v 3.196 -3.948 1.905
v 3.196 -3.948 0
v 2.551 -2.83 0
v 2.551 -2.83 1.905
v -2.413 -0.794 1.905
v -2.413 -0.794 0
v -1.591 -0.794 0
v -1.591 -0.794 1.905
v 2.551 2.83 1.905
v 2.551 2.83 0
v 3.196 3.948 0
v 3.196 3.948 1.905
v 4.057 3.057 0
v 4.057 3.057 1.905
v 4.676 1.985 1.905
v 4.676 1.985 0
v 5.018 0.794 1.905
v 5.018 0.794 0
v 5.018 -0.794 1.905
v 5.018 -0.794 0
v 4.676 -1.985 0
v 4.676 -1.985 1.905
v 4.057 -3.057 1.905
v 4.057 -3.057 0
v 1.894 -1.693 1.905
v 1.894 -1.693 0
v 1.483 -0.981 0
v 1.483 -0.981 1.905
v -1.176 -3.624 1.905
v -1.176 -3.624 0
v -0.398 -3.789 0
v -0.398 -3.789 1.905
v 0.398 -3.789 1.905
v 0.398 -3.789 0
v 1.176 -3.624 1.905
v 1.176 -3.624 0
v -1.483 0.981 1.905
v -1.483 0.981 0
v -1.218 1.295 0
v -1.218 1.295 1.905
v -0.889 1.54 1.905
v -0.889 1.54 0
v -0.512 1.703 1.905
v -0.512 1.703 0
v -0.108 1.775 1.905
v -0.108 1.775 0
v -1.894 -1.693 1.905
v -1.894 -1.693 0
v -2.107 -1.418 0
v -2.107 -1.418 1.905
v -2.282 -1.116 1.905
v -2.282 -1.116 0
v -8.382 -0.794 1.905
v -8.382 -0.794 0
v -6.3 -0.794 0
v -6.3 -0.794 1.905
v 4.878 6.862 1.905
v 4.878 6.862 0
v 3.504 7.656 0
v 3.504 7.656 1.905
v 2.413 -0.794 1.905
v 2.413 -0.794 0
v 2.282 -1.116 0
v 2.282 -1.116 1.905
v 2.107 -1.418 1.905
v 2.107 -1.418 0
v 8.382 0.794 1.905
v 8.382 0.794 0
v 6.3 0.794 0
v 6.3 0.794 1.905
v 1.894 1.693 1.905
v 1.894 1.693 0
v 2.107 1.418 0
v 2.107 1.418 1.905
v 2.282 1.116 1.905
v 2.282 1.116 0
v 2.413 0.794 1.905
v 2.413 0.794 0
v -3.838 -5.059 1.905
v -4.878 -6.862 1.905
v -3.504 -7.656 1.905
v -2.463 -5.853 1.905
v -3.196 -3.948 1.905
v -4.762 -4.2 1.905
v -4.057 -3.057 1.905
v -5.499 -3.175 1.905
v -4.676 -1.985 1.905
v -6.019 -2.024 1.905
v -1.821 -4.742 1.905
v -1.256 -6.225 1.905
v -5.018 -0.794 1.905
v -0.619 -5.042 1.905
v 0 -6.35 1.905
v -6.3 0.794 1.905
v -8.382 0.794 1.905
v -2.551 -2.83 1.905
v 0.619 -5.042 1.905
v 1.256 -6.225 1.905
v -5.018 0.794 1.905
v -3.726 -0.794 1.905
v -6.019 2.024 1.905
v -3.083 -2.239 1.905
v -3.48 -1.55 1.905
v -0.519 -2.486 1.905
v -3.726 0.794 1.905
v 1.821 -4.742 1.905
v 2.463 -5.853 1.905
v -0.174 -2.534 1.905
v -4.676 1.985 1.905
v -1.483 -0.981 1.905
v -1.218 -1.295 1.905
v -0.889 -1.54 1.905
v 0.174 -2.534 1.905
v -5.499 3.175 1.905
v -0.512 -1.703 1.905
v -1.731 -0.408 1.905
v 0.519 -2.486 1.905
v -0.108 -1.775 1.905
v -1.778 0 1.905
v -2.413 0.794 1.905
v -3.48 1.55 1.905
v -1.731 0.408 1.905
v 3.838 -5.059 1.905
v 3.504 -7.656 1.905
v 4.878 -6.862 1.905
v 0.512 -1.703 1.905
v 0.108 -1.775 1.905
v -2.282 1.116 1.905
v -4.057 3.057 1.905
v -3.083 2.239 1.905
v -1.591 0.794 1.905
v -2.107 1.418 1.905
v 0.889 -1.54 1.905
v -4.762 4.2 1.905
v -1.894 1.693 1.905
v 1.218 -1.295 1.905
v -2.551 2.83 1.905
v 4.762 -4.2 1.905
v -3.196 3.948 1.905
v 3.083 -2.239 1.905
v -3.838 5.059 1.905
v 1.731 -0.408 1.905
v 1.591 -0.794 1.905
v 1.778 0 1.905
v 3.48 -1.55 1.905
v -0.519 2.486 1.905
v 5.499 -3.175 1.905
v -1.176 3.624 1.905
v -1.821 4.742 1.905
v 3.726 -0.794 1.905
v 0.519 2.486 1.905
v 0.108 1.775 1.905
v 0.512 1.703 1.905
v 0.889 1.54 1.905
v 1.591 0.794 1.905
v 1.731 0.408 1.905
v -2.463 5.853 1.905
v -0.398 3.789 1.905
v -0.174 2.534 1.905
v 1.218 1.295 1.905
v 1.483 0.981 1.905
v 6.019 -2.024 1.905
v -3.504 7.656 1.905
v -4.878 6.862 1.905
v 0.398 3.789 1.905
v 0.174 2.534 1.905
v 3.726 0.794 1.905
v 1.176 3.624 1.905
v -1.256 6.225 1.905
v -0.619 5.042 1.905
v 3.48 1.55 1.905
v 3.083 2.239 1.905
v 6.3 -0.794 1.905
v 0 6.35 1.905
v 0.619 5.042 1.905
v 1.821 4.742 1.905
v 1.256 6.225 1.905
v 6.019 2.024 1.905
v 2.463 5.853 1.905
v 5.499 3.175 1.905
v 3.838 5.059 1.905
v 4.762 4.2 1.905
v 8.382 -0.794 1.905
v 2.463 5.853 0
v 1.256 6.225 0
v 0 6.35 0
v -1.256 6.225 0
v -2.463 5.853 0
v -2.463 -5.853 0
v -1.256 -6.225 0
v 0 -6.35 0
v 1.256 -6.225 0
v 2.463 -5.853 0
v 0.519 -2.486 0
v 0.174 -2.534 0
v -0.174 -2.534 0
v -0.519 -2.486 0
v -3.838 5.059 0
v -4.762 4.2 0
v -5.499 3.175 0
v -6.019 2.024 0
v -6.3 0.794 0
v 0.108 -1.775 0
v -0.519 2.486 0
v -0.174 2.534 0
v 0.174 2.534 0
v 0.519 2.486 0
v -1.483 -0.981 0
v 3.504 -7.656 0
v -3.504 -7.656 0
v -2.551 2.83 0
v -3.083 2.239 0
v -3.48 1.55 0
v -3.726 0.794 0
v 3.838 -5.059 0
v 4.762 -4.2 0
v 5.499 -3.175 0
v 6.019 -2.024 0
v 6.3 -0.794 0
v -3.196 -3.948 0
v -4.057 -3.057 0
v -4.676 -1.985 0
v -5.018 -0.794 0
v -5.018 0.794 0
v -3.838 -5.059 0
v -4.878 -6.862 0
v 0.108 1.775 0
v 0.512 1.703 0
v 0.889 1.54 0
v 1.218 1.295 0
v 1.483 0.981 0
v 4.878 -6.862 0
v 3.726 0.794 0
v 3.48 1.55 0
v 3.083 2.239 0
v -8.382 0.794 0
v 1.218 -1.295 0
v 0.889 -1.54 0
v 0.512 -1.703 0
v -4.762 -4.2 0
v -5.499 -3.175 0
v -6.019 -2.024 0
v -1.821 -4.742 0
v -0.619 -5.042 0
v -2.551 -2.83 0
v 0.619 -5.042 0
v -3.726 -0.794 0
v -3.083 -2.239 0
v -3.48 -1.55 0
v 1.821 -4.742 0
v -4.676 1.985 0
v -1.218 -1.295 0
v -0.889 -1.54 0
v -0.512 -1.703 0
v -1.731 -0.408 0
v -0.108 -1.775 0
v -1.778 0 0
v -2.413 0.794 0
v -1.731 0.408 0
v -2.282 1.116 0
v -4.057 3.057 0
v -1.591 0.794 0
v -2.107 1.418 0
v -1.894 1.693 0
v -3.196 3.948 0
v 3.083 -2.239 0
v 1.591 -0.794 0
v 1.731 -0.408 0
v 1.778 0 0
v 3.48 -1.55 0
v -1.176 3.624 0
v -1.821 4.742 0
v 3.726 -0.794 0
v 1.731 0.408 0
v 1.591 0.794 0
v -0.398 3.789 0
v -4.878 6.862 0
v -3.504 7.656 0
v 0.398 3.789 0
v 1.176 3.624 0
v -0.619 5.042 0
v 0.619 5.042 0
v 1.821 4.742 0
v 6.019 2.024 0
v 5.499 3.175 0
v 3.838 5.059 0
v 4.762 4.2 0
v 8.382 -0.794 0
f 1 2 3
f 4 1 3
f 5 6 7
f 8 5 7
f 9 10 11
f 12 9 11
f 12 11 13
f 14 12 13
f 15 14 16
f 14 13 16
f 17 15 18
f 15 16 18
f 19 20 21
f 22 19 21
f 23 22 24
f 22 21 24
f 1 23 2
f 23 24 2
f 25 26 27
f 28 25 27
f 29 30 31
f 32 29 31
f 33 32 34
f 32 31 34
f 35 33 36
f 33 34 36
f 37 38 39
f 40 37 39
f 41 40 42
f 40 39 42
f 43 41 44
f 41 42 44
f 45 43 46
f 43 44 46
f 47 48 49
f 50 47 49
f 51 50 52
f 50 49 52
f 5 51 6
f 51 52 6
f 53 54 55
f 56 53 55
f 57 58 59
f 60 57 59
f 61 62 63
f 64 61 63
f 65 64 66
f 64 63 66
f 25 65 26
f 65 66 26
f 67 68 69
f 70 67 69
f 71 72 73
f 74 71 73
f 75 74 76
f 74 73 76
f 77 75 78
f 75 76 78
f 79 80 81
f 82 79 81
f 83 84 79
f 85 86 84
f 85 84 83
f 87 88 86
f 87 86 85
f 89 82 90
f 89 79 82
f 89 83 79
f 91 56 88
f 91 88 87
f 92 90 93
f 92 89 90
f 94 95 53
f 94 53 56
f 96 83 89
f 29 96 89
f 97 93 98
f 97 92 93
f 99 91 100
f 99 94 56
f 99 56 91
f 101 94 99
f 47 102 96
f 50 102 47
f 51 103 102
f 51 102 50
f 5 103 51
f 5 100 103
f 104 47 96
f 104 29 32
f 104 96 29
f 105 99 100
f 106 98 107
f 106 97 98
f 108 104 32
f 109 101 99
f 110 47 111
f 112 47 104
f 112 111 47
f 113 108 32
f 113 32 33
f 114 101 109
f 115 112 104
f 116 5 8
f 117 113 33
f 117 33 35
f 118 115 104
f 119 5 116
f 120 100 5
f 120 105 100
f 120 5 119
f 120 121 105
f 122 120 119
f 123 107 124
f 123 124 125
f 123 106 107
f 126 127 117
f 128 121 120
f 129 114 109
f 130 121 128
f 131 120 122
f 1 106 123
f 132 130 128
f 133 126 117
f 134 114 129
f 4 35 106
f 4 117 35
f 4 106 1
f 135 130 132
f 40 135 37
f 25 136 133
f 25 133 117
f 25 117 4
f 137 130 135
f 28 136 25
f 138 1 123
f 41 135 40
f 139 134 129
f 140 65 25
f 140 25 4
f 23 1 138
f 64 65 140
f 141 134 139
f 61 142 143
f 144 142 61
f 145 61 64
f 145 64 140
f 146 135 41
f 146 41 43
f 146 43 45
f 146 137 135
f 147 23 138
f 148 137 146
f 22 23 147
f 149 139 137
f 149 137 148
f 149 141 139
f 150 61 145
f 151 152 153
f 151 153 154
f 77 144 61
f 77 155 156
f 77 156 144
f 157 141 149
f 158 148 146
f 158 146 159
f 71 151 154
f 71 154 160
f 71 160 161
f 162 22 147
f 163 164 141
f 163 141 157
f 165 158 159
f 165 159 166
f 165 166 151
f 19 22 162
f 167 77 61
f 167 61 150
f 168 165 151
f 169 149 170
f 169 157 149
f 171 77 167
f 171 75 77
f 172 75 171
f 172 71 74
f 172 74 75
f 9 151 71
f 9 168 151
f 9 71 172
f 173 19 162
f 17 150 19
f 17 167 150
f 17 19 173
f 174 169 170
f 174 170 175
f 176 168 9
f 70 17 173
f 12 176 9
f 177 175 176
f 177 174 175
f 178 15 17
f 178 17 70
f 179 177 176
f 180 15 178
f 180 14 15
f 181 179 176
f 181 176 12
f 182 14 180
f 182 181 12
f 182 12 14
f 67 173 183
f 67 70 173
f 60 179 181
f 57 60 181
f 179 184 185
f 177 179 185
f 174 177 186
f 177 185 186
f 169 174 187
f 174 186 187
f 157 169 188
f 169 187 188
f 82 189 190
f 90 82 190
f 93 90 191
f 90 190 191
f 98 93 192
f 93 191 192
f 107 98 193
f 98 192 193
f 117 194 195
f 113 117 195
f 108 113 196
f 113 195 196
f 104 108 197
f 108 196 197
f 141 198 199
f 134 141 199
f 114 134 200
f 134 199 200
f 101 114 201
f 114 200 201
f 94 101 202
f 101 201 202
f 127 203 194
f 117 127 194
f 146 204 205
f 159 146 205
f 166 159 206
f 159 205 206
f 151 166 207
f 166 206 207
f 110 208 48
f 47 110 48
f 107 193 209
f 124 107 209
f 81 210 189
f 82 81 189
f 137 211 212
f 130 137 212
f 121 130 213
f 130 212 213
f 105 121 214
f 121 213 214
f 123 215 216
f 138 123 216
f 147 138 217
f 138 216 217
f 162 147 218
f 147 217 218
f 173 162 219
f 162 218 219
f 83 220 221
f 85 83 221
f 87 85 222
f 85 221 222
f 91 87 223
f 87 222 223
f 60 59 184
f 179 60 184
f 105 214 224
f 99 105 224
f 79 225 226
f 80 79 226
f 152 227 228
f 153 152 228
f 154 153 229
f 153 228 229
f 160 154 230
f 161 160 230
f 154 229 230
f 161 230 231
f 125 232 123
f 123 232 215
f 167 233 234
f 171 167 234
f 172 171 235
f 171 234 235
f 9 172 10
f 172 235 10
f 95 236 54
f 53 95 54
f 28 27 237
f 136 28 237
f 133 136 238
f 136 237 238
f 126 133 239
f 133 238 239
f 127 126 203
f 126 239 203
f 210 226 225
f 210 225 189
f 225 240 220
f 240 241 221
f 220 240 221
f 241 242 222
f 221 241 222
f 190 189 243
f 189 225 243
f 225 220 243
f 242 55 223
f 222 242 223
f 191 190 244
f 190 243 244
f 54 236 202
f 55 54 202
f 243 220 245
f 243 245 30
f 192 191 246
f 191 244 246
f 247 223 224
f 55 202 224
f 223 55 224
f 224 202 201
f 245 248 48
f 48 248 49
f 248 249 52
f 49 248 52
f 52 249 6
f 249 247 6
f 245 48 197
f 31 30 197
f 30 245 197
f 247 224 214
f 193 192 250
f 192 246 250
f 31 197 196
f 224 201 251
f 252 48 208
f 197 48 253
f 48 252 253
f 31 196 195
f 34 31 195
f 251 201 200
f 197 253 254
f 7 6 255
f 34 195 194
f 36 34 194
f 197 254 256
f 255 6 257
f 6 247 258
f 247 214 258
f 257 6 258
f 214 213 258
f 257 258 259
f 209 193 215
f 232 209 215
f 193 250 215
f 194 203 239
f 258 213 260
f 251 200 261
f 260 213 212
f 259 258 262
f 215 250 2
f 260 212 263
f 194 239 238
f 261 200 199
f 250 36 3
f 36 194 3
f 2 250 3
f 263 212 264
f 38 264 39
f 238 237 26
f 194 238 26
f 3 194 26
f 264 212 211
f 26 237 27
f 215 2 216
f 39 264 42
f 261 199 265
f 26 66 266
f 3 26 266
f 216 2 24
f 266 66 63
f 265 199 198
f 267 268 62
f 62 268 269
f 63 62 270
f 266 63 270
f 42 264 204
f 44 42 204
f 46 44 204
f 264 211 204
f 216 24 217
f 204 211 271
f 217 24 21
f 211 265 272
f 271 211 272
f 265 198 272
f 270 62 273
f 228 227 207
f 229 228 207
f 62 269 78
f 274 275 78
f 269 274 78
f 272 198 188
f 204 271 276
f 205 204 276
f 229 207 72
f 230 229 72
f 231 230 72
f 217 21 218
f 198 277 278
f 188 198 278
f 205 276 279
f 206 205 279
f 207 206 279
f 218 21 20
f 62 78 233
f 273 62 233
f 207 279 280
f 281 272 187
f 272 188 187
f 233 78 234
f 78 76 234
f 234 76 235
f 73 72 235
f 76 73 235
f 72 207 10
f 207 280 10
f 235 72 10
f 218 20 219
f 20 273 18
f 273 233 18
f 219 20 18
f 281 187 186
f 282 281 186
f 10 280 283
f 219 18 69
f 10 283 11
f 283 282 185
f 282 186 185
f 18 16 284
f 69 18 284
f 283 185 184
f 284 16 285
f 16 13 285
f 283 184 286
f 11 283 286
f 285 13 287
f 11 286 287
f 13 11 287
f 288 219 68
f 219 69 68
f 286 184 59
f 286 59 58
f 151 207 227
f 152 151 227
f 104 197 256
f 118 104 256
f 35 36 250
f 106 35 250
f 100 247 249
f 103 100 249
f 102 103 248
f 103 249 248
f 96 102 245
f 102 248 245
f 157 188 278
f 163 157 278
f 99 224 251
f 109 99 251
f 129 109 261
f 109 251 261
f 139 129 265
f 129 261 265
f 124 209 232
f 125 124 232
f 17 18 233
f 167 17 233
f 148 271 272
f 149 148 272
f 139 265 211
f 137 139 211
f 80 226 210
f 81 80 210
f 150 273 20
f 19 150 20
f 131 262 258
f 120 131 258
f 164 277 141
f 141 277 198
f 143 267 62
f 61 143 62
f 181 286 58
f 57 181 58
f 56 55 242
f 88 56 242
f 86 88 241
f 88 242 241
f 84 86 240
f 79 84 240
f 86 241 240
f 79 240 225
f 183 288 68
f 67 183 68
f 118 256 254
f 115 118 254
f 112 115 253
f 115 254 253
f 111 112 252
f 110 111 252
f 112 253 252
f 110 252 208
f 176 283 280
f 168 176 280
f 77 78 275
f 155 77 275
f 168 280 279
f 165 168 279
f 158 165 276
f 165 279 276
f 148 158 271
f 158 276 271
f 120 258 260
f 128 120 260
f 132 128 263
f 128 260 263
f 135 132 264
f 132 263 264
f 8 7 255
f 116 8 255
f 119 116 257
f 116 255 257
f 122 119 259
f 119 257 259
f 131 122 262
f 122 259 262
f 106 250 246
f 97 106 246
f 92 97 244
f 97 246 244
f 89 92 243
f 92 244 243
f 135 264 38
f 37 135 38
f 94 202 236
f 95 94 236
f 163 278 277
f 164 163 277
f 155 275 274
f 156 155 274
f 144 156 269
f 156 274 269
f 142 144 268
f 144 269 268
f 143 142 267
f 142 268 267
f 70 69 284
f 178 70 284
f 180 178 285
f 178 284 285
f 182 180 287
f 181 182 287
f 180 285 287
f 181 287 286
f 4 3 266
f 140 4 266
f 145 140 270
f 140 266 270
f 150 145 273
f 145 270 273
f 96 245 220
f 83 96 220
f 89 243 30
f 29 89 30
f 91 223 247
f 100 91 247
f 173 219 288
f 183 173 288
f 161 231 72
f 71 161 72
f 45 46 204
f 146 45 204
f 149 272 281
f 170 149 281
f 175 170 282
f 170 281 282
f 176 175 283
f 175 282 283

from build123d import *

# Parameters (mm, degrees)
F1_DEPTH = 1.905


with BuildPart() as f1:
    # F0 (on Top) → F1 (new body)
    with BuildSketch(Plane.XY):
        with BuildLine():
            Line((-4.878408, 6.86215), (-3.837505, 5.059254))
            ThreePointArc((-3.837505, 5.059254), (-5.499261, 3.175), (-6.300195, 0.79375))
            Line((-6.300195, 0.79375), (-8.382, 0.79375))
            Line((-8.382, 0.79375), (-8.382, -0.79375))
            Line((-8.382, -0.79375), (-6.300195, -0.79375))
            ThreePointArc((-6.300195, -0.79375), (-5.499261, -3.175), (-3.837505, -5.059254))
            Line((-3.837505, -5.059254), (-4.878408, -6.86215))
            Line((-4.878408, -6.86215), (-3.503592, -7.6559))
            Line((-3.503592, -7.6559), (-2.46269, -5.853004))
            ThreePointArc((-2.46269, -5.853004), (0, -6.35), (2.46269, -5.853004))
            Line((2.46269, -5.853004), (3.503592, -7.6559))
            Line((3.503592, -7.6559), (4.878408, -6.86215))
            Line((4.878408, -6.86215), (3.837505, -5.059254))
            ThreePointArc((3.837505, -5.059254), (5.499261, -3.175), (6.300195, -0.79375))
            Line((6.300195, -0.79375), (8.382, -0.79375))
            Line((8.382, -0.79375), (8.382, 0.79375))
            Line((8.382, 0.79375), (6.300195, 0.79375))
            ThreePointArc((6.300195, 0.79375), (5.499261, 3.175), (3.837505, 5.059254))
            Line((3.837505, 5.059254), (4.878408, 6.86215))
            Line((4.878408, 6.86215), (3.503592, 7.6559))
            Line((3.503592, 7.6559), (2.46269, 5.853004))
            ThreePointArc((2.46269, 5.853004), (0, 6.35), (-2.46269, 5.853004))
            Line((-2.46269, 5.853004), (-3.503592, 7.6559))
            Line((-3.503592, 7.6559), (-4.878408, 6.86215))
        make_face()
        with BuildLine():
            ThreePointArc((-3.19621, -3.948498), (-4.399409, -2.54), (-5.017605, -0.79375))
            Line((-5.017605, -0.79375), (-3.726401, -0.79375))
            ThreePointArc((-3.726401, -0.79375), (-3.299557, -1.905), (-2.550608, -2.830283))
            Line((-2.550608, -2.830283), (-3.19621, -3.948498))
        make_face(mode=Mode.SUBTRACT)
        with BuildLine():
            ThreePointArc((1.821395, -4.742248), (0, -5.08), (-1.821395, -4.742248))
            Line((-1.821395, -4.742248), (-1.175793, -3.624033))
            ThreePointArc((-1.175793, -3.624033), (0, -3.81), (1.175793, -3.624033))
            Line((1.175793, -3.624033), (1.821395, -4.742248))
        make_face(mode=Mode.SUBTRACT)
        with BuildLine():
            Line((3.726401, -0.79375), (5.017605, -0.79375))
            ThreePointArc((5.017605, -0.79375), (4.399409, -2.54), (3.19621, -3.948498))
            Line((3.19621, -3.948498), (2.550608, -2.830283))
            ThreePointArc((2.550608, -2.830283), (3.299557, -1.905), (3.726401, -0.79375))
        make_face(mode=Mode.SUBTRACT)
        with BuildLine():
            ThreePointArc((-5.017605, 0.79375), (-4.399409, 2.54), (-3.19621, 3.948498))
            Line((-3.19621, 3.948498), (-2.550608, 2.830283))
            ThreePointArc((-2.550608, 2.830283), (-3.299557, 1.905), (-3.726401, 0.79375))
            Line((-3.726401, 0.79375), (-5.017605, 0.79375))
        make_face(mode=Mode.SUBTRACT)
        with BuildLine():
            ThreePointArc((-2.412791, 0.79375), (-2.199705, 1.27), (-1.893803, 1.692663))
            Line((-1.893803, 1.692663), (-1.482902, 0.980962))
            ThreePointArc((-1.482902, 0.980962), (-0.889, 1.539793), (-0.108087, 1.774712))
            Line((-0.108087, 1.774712), (-0.518988, 2.486413))
            ThreePointArc((-0.518988, 2.486413), (0, 2.54), (0.518988, 2.486413))
            Line((0.518988, 2.486413), (0.108087, 1.774712))
            ThreePointArc((0.108087, 1.774712), (0.889, 1.539793), (1.482902, 0.980962))
            Line((1.482902, 0.980962), (1.893803, 1.692663))
            ThreePointArc((1.893803, 1.692663), (2.199705, 1.27), (2.412791, 0.79375))
            Line((2.412791, 0.79375), (1.590989, 0.79375))
            ThreePointArc((1.590989, 0.79375), (1.778, 0), (1.590989, -0.79375))
            Line((1.590989, -0.79375), (2.412791, -0.79375))
            ThreePointArc((2.412791, -0.79375), (2.199705, -1.27), (1.893803, -1.692663))
            Line((1.893803, -1.692663), (1.482902, -0.980962))
            ThreePointArc((1.482902, -0.980962), (0.889, -1.539793), (0.108087, -1.774712))
            Line((0.108087, -1.774712), (0.518988, -2.486413))
            ThreePointArc((0.518988, -2.486413), (0, -2.54), (-0.518988, -2.486413))
            Line((-0.518988, -2.486413), (-0.108087, -1.774712))
            ThreePointArc((-0.108087, -1.774712), (-0.889, -1.539793), (-1.482902, -0.980962))
            Line((-1.482902, -0.980962), (-1.893803, -1.692663))
            ThreePointArc((-1.893803, -1.692663), (-2.199705, -1.27), (-2.412791, -0.79375))
            Line((-2.412791, -0.79375), (-1.590989, -0.79375))
            ThreePointArc((-1.590989, -0.79375), (-1.778, 0), (-1.590989, 0.79375))
            Line((-1.590989, 0.79375), (-2.412791, 0.79375))
        make_face(mode=Mode.SUBTRACT)
        with BuildLine():
            ThreePointArc((3.19621, 3.948498), (4.399409, 2.54), (5.017605, 0.79375))
            Line((5.017605, 0.79375), (3.726401, 0.79375))
            ThreePointArc((3.726401, 0.79375), (3.299557, 1.905), (2.550608, 2.830283))
            Line((2.550608, 2.830283), (3.19621, 3.948498))
        make_face(mode=Mode.SUBTRACT)
        with BuildLine():
            Line((-1.175793, 3.624033), (-1.821395, 4.742248))
            ThreePointArc((-1.821395, 4.742248), (0, 5.08), (1.821395, 4.742248))
            Line((1.821395, 4.742248), (1.175793, 3.624033))
            ThreePointArc((1.175793, 3.624033), (0, 3.81), (-1.175793, 3.624033))
        make_face(mode=Mode.SUBTRACT)
    extrude(amount=F1_DEPTH)


solid = f1.part
